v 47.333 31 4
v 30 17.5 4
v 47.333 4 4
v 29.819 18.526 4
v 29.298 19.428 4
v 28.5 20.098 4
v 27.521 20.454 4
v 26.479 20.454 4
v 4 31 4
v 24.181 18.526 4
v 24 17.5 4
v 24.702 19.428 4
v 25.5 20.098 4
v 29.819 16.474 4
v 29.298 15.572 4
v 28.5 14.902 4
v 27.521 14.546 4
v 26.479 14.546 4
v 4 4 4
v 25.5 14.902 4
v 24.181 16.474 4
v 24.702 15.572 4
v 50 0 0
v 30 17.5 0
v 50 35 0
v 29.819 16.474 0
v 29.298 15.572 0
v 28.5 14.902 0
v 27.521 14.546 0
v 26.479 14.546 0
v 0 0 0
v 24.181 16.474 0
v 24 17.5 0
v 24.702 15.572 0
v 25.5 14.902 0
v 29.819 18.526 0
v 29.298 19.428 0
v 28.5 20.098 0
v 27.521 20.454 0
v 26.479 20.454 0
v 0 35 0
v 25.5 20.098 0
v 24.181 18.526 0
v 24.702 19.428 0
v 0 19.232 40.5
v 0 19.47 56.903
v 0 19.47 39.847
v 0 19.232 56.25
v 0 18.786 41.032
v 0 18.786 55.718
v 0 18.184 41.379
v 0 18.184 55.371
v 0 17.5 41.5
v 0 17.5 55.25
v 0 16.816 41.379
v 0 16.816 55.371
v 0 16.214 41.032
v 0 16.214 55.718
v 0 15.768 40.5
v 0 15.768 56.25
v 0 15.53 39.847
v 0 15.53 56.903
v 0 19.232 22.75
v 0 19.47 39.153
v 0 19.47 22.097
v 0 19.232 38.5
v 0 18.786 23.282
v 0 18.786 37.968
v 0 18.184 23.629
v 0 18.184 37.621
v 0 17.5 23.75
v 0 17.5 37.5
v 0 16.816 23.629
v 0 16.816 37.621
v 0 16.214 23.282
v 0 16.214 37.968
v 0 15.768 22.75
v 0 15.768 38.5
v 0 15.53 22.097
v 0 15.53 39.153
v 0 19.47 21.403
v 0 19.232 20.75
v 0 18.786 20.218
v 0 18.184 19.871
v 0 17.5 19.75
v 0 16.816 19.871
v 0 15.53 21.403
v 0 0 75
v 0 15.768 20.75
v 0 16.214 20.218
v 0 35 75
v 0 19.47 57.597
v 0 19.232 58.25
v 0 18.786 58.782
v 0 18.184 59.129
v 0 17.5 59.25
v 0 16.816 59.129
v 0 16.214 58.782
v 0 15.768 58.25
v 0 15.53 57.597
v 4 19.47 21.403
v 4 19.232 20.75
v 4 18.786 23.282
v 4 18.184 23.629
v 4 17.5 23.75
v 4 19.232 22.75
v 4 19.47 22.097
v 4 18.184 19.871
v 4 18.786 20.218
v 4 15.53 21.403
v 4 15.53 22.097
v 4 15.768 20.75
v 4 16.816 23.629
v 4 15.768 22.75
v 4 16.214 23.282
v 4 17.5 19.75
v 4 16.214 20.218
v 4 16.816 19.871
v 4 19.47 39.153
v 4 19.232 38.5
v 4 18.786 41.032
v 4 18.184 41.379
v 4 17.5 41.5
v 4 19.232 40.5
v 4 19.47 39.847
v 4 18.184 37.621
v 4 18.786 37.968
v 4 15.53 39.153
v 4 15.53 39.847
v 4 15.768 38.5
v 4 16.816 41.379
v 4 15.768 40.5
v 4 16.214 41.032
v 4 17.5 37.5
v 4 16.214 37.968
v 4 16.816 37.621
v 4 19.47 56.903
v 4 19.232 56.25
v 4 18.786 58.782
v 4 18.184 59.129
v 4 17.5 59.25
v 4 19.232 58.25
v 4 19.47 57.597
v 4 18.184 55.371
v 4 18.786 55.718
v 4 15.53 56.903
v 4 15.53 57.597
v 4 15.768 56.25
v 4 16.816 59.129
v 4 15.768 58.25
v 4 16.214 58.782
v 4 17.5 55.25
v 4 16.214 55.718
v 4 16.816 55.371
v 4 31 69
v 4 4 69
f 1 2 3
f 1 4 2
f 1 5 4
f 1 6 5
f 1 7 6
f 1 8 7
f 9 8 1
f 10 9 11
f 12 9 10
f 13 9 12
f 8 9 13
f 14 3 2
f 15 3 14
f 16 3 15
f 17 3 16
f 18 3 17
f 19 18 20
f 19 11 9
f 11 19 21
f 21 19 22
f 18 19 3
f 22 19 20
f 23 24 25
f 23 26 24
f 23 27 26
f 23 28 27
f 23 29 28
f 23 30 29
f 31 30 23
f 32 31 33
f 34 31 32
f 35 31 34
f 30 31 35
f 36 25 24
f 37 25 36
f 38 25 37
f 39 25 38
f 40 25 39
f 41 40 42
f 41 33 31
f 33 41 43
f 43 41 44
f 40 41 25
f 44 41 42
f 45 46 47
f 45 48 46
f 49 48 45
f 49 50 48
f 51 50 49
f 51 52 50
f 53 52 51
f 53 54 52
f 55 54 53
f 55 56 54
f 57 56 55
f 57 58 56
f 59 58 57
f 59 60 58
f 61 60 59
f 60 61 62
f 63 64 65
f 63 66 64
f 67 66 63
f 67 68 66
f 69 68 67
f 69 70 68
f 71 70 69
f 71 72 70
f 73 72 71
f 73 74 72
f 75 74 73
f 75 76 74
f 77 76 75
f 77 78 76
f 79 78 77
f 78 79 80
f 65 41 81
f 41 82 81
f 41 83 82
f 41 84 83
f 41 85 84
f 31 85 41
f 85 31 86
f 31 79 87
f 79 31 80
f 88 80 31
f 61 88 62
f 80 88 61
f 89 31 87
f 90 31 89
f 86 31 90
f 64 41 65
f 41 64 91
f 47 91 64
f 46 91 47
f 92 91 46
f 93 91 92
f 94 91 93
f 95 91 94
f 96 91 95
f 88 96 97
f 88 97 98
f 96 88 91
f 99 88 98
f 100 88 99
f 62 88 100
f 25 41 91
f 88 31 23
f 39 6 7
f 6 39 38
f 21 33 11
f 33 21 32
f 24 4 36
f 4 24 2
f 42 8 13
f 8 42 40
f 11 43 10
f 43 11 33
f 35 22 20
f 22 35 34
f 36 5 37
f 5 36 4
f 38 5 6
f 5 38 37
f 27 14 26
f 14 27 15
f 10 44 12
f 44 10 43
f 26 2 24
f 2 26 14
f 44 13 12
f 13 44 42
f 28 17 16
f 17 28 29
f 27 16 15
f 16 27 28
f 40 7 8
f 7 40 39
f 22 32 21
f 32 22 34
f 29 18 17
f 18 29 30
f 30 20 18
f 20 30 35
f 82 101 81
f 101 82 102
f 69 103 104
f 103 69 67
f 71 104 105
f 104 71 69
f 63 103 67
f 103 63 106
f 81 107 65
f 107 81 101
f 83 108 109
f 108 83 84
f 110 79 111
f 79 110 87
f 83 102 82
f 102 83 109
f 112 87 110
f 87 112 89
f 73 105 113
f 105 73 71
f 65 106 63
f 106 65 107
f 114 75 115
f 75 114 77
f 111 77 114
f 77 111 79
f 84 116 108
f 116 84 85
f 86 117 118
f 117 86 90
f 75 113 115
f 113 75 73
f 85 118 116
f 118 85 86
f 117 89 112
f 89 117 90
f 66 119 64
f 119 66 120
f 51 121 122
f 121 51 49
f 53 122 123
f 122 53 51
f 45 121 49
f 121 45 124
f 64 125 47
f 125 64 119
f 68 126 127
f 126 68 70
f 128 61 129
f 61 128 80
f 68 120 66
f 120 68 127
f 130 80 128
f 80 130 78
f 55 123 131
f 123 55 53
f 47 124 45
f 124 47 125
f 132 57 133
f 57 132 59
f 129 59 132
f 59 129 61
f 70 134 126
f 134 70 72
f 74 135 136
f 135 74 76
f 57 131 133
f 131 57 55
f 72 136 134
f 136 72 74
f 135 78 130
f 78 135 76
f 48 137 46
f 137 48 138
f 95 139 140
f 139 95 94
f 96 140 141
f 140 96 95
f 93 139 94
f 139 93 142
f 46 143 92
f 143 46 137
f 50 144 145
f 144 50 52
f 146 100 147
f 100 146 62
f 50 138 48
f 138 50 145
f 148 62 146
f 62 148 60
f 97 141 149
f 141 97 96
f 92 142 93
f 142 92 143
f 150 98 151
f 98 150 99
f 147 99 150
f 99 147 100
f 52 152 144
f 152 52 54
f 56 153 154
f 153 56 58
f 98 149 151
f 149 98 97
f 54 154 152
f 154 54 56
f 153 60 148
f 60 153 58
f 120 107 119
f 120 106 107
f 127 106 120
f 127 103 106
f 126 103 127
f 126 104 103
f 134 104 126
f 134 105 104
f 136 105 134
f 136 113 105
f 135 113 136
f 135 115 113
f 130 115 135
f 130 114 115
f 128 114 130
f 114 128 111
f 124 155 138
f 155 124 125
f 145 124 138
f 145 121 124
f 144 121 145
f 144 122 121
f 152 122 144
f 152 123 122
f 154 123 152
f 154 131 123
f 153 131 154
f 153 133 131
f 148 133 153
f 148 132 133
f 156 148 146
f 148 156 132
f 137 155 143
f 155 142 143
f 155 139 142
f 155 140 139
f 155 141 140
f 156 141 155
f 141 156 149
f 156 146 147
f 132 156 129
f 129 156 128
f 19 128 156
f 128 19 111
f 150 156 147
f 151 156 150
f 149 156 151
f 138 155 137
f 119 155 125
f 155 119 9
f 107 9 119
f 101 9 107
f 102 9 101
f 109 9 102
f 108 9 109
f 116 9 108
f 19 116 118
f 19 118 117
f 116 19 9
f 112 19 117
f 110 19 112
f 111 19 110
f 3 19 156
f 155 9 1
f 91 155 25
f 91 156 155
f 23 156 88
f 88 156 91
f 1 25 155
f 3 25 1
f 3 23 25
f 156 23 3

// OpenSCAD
// file: ../lib/utils.scad
///< Utilities

function rand_clr() = rands( 0,1,3 );

///< Length conversions
function in2mm( i ) = ( i * 25.4 ); 
function mm2in( m ) = ( m / 25.4 );

/// This is pulled from stackoverflow
/// https://stackoverflow.com/questions/45826208/openscad-rotating-around-a-particular-point

// rotate as per a, v, but around point pt
module rotate_about_pt(z, y, pt) {
    translate(pt)
        rotate([0, y, z ])
            translate(-pt)
                children();   
}

function adjust_z_offset( v, z ) = [for (i=[0:(len(v)-1)]) v[i]+[0,0,z]] ;

///< For each child, translate child by <p> point in points
module foreach_translate(points ){
	for (p=points){
		translate(p) children();
	}
}
// file: ../lib/math.scad
///< Math scad module


///< Find the hypotenuse from two sides of a right triangle
function hyp_from_sides( a, b ) = sqrt( pow( a, 2 ) + pow( b, 2 ) );

///< Find equal sides from hypotenuse of a right triangle
function sides_from_hyp(h) = sqrt( pow( h, 2 ) / 2 );

///< Find A from hypotenuse and B
function a_from_hb( h, b ) = sqrt( pow( h, 2 ) - pow( b, 2 ) );

function dist_2d( pt2, pt1 ) = sqrt(pow(( pt2[0]-pt1[0] ),2) + pow(( pt2[1]-pt1[1]),2) );

function mid_pt_2d( pt2, pt1 ) = [( pt1[0]+pt2[0] )/2, ( pt1[1]+pt2[1] )/2, 0 ];
///< Test for math functions

A = 3;
B = 4;
echo("Given A=", A, "and B=", B );
H = hyp_from_sides( A, B );
echo("Hypotenuse=", H );
echo("Calc Correct = ", (H == 5) );

echo("Given H=", H, " which is a hypotenuse with equal sides" );
echo( "the sides=", sides_from_hyp( H ) );

echo("Given H=", H, "B=", 4 );
echo("A=", a_from_hb( H, 4 ) );

echo("Distance from [-1,1] and [3,4] = ", dist_2d( [-1,1],[3,4]) );

///< Find the sum of a vector <vect> starting from <s> and continuing to <i>
function sumv( vect, i, s=0 ) = ( i == s ? vect[ i ] : vect[ i ] + sumv( vect, i - 1, s ) );
vec = [ 1, 2, 3, 4 ];
l = len( vec )-1;
echo( "Sum vec = ", sumv( vec, l, 0 ) );

///< Find the average of a vector <vect> starting at <s>
function average( vect, s=0 ) = (len( vect ) == 0 ? 0 : ( sumv( vect, len( vect ) - 1, s )/len(vect) ) );
echo( "Ave vec = ", average( vec ) );
vec2 = [];
echo( "Ave vec2 = ", average( vec2 ) );
// main file
///< Object definition
use <../lib/math.scad>;
use <../lib/utils.scad>;


/*
Module: Shelf Bracket
Example from online book 'Mastering Openscad'
https://mastering-openscad.eu/buch/example_01
*/

/*
Parameters
*/

// Side A length
side_a_l = 50; // [0:1:100]

// Side A hole diameter
side_a_hole_dia = 6; // [0:1:100]

// Side A number of holes
side_a_num_holes = 1;

// Side B length
side_b_l = 75; // [0:1:100]

// Side B hole diameter
side_b_hole_dia = 4; // [0:1:100]

// Side B number of holes
side_b_num_holes = 3;

// Width
width = 35; // [0:1:100]

// Thickness
thickness = 4; // [0:1:100]

// Generate drilling templates
templates = false; 

// Rotate the build for printing
rotate_it = false;

///< Parameters after this are hidden from the customizer
module __Customizer_Limit__(){}


///< Modules

/*
        module shelf_bracket

        parameters:
        - side_a    is a vector [length, hole diameter, number of holes]
        - side_b    is a vector [length, hole diameter, number of holes]
        - width     refers to the width of the bracket
        - thickness refers to the material thickness of the bracket
*/
module shelf_bracket( side_a, side_b, width, thickness, rotate_it = false ){

    module xhole_plate( size, h_dm, h_num, margin ){
        /* X holed plate: Size, hole diameter, num holes, margin */
        difference(){
            cube( size );
            h_distance = ( size.x - margin )/(h_num + 1 );
            for ( x = [1:h_num] )
                translate( [
                            margin + x * h_distance,
                            size.y/2,
                            -1
                            ])
                    cylinder( d = h_dm, h = size.z + 2, $fn = 18 );
        }
    }
    // Determine the hypotenuse and angle or rotation for the cut
    diag = sqrt( pow( side_a[0], 2 ) + pow( side_b[0], 2) );
    angle = asin( side_a[0] / diag );
    rot_h = cos( angle ) * side_a[0];
    
    translate( [0,0, rotate_it ? rot_h : 0] )
    rotate( [0, rotate_it ? 90 + angle : 0, 0 ] )
    difference(){
        union(){
            // Side A
            xhole_plate(
                        [ side_a[0], width, thickness ],
                        side_a[1],
                        side_a[2],
                        thickness
                        );

            // Side B
            translate( [ thickness, 0, 0 ] )
                rotate( [ 0, -90, 0 ] )
                xhole_plate(
                            [ side_b[0], width, thickness ],
                            side_b[1],
                            side_b[2],
                            thickness
                            );

            // Stringer
            cube( [ side_a[0], thickness, side_b[0] ] );

            translate( [ 0, width - thickness, 0 ] )
                cube( [ side_a[0], thickness, side_b[0] ] );
        }

        // Cut
        color("red" )
        translate( [ side_a[0], -1, 0] )
            rotate( [ 0, -angle, 0 ] )
            cube( [ diag, width + 2, diag + 2 ] );
    }
}


module output( tempaltes = false ){

    if ( templates ) {
        /// Drilling template
        projection( cut = true )
            children(0);

        translate( [-0.01, 0, 0] )
            projection( cut = true )
            rotate( [0, -90, 0 ] )
            children(0);

    } else {
        children(0);
    }
}

output( templates )
///< Build object
shelf_bracket(
              side_a    = [ side_a_l, side_a_hole_dia, side_a_num_holes ],
              side_b    = [ side_b_l, side_b_hole_dia, side_b_num_holes ],
              width     = width,
              thickness = thickness,
              rotate_it = rotate_it
              );
